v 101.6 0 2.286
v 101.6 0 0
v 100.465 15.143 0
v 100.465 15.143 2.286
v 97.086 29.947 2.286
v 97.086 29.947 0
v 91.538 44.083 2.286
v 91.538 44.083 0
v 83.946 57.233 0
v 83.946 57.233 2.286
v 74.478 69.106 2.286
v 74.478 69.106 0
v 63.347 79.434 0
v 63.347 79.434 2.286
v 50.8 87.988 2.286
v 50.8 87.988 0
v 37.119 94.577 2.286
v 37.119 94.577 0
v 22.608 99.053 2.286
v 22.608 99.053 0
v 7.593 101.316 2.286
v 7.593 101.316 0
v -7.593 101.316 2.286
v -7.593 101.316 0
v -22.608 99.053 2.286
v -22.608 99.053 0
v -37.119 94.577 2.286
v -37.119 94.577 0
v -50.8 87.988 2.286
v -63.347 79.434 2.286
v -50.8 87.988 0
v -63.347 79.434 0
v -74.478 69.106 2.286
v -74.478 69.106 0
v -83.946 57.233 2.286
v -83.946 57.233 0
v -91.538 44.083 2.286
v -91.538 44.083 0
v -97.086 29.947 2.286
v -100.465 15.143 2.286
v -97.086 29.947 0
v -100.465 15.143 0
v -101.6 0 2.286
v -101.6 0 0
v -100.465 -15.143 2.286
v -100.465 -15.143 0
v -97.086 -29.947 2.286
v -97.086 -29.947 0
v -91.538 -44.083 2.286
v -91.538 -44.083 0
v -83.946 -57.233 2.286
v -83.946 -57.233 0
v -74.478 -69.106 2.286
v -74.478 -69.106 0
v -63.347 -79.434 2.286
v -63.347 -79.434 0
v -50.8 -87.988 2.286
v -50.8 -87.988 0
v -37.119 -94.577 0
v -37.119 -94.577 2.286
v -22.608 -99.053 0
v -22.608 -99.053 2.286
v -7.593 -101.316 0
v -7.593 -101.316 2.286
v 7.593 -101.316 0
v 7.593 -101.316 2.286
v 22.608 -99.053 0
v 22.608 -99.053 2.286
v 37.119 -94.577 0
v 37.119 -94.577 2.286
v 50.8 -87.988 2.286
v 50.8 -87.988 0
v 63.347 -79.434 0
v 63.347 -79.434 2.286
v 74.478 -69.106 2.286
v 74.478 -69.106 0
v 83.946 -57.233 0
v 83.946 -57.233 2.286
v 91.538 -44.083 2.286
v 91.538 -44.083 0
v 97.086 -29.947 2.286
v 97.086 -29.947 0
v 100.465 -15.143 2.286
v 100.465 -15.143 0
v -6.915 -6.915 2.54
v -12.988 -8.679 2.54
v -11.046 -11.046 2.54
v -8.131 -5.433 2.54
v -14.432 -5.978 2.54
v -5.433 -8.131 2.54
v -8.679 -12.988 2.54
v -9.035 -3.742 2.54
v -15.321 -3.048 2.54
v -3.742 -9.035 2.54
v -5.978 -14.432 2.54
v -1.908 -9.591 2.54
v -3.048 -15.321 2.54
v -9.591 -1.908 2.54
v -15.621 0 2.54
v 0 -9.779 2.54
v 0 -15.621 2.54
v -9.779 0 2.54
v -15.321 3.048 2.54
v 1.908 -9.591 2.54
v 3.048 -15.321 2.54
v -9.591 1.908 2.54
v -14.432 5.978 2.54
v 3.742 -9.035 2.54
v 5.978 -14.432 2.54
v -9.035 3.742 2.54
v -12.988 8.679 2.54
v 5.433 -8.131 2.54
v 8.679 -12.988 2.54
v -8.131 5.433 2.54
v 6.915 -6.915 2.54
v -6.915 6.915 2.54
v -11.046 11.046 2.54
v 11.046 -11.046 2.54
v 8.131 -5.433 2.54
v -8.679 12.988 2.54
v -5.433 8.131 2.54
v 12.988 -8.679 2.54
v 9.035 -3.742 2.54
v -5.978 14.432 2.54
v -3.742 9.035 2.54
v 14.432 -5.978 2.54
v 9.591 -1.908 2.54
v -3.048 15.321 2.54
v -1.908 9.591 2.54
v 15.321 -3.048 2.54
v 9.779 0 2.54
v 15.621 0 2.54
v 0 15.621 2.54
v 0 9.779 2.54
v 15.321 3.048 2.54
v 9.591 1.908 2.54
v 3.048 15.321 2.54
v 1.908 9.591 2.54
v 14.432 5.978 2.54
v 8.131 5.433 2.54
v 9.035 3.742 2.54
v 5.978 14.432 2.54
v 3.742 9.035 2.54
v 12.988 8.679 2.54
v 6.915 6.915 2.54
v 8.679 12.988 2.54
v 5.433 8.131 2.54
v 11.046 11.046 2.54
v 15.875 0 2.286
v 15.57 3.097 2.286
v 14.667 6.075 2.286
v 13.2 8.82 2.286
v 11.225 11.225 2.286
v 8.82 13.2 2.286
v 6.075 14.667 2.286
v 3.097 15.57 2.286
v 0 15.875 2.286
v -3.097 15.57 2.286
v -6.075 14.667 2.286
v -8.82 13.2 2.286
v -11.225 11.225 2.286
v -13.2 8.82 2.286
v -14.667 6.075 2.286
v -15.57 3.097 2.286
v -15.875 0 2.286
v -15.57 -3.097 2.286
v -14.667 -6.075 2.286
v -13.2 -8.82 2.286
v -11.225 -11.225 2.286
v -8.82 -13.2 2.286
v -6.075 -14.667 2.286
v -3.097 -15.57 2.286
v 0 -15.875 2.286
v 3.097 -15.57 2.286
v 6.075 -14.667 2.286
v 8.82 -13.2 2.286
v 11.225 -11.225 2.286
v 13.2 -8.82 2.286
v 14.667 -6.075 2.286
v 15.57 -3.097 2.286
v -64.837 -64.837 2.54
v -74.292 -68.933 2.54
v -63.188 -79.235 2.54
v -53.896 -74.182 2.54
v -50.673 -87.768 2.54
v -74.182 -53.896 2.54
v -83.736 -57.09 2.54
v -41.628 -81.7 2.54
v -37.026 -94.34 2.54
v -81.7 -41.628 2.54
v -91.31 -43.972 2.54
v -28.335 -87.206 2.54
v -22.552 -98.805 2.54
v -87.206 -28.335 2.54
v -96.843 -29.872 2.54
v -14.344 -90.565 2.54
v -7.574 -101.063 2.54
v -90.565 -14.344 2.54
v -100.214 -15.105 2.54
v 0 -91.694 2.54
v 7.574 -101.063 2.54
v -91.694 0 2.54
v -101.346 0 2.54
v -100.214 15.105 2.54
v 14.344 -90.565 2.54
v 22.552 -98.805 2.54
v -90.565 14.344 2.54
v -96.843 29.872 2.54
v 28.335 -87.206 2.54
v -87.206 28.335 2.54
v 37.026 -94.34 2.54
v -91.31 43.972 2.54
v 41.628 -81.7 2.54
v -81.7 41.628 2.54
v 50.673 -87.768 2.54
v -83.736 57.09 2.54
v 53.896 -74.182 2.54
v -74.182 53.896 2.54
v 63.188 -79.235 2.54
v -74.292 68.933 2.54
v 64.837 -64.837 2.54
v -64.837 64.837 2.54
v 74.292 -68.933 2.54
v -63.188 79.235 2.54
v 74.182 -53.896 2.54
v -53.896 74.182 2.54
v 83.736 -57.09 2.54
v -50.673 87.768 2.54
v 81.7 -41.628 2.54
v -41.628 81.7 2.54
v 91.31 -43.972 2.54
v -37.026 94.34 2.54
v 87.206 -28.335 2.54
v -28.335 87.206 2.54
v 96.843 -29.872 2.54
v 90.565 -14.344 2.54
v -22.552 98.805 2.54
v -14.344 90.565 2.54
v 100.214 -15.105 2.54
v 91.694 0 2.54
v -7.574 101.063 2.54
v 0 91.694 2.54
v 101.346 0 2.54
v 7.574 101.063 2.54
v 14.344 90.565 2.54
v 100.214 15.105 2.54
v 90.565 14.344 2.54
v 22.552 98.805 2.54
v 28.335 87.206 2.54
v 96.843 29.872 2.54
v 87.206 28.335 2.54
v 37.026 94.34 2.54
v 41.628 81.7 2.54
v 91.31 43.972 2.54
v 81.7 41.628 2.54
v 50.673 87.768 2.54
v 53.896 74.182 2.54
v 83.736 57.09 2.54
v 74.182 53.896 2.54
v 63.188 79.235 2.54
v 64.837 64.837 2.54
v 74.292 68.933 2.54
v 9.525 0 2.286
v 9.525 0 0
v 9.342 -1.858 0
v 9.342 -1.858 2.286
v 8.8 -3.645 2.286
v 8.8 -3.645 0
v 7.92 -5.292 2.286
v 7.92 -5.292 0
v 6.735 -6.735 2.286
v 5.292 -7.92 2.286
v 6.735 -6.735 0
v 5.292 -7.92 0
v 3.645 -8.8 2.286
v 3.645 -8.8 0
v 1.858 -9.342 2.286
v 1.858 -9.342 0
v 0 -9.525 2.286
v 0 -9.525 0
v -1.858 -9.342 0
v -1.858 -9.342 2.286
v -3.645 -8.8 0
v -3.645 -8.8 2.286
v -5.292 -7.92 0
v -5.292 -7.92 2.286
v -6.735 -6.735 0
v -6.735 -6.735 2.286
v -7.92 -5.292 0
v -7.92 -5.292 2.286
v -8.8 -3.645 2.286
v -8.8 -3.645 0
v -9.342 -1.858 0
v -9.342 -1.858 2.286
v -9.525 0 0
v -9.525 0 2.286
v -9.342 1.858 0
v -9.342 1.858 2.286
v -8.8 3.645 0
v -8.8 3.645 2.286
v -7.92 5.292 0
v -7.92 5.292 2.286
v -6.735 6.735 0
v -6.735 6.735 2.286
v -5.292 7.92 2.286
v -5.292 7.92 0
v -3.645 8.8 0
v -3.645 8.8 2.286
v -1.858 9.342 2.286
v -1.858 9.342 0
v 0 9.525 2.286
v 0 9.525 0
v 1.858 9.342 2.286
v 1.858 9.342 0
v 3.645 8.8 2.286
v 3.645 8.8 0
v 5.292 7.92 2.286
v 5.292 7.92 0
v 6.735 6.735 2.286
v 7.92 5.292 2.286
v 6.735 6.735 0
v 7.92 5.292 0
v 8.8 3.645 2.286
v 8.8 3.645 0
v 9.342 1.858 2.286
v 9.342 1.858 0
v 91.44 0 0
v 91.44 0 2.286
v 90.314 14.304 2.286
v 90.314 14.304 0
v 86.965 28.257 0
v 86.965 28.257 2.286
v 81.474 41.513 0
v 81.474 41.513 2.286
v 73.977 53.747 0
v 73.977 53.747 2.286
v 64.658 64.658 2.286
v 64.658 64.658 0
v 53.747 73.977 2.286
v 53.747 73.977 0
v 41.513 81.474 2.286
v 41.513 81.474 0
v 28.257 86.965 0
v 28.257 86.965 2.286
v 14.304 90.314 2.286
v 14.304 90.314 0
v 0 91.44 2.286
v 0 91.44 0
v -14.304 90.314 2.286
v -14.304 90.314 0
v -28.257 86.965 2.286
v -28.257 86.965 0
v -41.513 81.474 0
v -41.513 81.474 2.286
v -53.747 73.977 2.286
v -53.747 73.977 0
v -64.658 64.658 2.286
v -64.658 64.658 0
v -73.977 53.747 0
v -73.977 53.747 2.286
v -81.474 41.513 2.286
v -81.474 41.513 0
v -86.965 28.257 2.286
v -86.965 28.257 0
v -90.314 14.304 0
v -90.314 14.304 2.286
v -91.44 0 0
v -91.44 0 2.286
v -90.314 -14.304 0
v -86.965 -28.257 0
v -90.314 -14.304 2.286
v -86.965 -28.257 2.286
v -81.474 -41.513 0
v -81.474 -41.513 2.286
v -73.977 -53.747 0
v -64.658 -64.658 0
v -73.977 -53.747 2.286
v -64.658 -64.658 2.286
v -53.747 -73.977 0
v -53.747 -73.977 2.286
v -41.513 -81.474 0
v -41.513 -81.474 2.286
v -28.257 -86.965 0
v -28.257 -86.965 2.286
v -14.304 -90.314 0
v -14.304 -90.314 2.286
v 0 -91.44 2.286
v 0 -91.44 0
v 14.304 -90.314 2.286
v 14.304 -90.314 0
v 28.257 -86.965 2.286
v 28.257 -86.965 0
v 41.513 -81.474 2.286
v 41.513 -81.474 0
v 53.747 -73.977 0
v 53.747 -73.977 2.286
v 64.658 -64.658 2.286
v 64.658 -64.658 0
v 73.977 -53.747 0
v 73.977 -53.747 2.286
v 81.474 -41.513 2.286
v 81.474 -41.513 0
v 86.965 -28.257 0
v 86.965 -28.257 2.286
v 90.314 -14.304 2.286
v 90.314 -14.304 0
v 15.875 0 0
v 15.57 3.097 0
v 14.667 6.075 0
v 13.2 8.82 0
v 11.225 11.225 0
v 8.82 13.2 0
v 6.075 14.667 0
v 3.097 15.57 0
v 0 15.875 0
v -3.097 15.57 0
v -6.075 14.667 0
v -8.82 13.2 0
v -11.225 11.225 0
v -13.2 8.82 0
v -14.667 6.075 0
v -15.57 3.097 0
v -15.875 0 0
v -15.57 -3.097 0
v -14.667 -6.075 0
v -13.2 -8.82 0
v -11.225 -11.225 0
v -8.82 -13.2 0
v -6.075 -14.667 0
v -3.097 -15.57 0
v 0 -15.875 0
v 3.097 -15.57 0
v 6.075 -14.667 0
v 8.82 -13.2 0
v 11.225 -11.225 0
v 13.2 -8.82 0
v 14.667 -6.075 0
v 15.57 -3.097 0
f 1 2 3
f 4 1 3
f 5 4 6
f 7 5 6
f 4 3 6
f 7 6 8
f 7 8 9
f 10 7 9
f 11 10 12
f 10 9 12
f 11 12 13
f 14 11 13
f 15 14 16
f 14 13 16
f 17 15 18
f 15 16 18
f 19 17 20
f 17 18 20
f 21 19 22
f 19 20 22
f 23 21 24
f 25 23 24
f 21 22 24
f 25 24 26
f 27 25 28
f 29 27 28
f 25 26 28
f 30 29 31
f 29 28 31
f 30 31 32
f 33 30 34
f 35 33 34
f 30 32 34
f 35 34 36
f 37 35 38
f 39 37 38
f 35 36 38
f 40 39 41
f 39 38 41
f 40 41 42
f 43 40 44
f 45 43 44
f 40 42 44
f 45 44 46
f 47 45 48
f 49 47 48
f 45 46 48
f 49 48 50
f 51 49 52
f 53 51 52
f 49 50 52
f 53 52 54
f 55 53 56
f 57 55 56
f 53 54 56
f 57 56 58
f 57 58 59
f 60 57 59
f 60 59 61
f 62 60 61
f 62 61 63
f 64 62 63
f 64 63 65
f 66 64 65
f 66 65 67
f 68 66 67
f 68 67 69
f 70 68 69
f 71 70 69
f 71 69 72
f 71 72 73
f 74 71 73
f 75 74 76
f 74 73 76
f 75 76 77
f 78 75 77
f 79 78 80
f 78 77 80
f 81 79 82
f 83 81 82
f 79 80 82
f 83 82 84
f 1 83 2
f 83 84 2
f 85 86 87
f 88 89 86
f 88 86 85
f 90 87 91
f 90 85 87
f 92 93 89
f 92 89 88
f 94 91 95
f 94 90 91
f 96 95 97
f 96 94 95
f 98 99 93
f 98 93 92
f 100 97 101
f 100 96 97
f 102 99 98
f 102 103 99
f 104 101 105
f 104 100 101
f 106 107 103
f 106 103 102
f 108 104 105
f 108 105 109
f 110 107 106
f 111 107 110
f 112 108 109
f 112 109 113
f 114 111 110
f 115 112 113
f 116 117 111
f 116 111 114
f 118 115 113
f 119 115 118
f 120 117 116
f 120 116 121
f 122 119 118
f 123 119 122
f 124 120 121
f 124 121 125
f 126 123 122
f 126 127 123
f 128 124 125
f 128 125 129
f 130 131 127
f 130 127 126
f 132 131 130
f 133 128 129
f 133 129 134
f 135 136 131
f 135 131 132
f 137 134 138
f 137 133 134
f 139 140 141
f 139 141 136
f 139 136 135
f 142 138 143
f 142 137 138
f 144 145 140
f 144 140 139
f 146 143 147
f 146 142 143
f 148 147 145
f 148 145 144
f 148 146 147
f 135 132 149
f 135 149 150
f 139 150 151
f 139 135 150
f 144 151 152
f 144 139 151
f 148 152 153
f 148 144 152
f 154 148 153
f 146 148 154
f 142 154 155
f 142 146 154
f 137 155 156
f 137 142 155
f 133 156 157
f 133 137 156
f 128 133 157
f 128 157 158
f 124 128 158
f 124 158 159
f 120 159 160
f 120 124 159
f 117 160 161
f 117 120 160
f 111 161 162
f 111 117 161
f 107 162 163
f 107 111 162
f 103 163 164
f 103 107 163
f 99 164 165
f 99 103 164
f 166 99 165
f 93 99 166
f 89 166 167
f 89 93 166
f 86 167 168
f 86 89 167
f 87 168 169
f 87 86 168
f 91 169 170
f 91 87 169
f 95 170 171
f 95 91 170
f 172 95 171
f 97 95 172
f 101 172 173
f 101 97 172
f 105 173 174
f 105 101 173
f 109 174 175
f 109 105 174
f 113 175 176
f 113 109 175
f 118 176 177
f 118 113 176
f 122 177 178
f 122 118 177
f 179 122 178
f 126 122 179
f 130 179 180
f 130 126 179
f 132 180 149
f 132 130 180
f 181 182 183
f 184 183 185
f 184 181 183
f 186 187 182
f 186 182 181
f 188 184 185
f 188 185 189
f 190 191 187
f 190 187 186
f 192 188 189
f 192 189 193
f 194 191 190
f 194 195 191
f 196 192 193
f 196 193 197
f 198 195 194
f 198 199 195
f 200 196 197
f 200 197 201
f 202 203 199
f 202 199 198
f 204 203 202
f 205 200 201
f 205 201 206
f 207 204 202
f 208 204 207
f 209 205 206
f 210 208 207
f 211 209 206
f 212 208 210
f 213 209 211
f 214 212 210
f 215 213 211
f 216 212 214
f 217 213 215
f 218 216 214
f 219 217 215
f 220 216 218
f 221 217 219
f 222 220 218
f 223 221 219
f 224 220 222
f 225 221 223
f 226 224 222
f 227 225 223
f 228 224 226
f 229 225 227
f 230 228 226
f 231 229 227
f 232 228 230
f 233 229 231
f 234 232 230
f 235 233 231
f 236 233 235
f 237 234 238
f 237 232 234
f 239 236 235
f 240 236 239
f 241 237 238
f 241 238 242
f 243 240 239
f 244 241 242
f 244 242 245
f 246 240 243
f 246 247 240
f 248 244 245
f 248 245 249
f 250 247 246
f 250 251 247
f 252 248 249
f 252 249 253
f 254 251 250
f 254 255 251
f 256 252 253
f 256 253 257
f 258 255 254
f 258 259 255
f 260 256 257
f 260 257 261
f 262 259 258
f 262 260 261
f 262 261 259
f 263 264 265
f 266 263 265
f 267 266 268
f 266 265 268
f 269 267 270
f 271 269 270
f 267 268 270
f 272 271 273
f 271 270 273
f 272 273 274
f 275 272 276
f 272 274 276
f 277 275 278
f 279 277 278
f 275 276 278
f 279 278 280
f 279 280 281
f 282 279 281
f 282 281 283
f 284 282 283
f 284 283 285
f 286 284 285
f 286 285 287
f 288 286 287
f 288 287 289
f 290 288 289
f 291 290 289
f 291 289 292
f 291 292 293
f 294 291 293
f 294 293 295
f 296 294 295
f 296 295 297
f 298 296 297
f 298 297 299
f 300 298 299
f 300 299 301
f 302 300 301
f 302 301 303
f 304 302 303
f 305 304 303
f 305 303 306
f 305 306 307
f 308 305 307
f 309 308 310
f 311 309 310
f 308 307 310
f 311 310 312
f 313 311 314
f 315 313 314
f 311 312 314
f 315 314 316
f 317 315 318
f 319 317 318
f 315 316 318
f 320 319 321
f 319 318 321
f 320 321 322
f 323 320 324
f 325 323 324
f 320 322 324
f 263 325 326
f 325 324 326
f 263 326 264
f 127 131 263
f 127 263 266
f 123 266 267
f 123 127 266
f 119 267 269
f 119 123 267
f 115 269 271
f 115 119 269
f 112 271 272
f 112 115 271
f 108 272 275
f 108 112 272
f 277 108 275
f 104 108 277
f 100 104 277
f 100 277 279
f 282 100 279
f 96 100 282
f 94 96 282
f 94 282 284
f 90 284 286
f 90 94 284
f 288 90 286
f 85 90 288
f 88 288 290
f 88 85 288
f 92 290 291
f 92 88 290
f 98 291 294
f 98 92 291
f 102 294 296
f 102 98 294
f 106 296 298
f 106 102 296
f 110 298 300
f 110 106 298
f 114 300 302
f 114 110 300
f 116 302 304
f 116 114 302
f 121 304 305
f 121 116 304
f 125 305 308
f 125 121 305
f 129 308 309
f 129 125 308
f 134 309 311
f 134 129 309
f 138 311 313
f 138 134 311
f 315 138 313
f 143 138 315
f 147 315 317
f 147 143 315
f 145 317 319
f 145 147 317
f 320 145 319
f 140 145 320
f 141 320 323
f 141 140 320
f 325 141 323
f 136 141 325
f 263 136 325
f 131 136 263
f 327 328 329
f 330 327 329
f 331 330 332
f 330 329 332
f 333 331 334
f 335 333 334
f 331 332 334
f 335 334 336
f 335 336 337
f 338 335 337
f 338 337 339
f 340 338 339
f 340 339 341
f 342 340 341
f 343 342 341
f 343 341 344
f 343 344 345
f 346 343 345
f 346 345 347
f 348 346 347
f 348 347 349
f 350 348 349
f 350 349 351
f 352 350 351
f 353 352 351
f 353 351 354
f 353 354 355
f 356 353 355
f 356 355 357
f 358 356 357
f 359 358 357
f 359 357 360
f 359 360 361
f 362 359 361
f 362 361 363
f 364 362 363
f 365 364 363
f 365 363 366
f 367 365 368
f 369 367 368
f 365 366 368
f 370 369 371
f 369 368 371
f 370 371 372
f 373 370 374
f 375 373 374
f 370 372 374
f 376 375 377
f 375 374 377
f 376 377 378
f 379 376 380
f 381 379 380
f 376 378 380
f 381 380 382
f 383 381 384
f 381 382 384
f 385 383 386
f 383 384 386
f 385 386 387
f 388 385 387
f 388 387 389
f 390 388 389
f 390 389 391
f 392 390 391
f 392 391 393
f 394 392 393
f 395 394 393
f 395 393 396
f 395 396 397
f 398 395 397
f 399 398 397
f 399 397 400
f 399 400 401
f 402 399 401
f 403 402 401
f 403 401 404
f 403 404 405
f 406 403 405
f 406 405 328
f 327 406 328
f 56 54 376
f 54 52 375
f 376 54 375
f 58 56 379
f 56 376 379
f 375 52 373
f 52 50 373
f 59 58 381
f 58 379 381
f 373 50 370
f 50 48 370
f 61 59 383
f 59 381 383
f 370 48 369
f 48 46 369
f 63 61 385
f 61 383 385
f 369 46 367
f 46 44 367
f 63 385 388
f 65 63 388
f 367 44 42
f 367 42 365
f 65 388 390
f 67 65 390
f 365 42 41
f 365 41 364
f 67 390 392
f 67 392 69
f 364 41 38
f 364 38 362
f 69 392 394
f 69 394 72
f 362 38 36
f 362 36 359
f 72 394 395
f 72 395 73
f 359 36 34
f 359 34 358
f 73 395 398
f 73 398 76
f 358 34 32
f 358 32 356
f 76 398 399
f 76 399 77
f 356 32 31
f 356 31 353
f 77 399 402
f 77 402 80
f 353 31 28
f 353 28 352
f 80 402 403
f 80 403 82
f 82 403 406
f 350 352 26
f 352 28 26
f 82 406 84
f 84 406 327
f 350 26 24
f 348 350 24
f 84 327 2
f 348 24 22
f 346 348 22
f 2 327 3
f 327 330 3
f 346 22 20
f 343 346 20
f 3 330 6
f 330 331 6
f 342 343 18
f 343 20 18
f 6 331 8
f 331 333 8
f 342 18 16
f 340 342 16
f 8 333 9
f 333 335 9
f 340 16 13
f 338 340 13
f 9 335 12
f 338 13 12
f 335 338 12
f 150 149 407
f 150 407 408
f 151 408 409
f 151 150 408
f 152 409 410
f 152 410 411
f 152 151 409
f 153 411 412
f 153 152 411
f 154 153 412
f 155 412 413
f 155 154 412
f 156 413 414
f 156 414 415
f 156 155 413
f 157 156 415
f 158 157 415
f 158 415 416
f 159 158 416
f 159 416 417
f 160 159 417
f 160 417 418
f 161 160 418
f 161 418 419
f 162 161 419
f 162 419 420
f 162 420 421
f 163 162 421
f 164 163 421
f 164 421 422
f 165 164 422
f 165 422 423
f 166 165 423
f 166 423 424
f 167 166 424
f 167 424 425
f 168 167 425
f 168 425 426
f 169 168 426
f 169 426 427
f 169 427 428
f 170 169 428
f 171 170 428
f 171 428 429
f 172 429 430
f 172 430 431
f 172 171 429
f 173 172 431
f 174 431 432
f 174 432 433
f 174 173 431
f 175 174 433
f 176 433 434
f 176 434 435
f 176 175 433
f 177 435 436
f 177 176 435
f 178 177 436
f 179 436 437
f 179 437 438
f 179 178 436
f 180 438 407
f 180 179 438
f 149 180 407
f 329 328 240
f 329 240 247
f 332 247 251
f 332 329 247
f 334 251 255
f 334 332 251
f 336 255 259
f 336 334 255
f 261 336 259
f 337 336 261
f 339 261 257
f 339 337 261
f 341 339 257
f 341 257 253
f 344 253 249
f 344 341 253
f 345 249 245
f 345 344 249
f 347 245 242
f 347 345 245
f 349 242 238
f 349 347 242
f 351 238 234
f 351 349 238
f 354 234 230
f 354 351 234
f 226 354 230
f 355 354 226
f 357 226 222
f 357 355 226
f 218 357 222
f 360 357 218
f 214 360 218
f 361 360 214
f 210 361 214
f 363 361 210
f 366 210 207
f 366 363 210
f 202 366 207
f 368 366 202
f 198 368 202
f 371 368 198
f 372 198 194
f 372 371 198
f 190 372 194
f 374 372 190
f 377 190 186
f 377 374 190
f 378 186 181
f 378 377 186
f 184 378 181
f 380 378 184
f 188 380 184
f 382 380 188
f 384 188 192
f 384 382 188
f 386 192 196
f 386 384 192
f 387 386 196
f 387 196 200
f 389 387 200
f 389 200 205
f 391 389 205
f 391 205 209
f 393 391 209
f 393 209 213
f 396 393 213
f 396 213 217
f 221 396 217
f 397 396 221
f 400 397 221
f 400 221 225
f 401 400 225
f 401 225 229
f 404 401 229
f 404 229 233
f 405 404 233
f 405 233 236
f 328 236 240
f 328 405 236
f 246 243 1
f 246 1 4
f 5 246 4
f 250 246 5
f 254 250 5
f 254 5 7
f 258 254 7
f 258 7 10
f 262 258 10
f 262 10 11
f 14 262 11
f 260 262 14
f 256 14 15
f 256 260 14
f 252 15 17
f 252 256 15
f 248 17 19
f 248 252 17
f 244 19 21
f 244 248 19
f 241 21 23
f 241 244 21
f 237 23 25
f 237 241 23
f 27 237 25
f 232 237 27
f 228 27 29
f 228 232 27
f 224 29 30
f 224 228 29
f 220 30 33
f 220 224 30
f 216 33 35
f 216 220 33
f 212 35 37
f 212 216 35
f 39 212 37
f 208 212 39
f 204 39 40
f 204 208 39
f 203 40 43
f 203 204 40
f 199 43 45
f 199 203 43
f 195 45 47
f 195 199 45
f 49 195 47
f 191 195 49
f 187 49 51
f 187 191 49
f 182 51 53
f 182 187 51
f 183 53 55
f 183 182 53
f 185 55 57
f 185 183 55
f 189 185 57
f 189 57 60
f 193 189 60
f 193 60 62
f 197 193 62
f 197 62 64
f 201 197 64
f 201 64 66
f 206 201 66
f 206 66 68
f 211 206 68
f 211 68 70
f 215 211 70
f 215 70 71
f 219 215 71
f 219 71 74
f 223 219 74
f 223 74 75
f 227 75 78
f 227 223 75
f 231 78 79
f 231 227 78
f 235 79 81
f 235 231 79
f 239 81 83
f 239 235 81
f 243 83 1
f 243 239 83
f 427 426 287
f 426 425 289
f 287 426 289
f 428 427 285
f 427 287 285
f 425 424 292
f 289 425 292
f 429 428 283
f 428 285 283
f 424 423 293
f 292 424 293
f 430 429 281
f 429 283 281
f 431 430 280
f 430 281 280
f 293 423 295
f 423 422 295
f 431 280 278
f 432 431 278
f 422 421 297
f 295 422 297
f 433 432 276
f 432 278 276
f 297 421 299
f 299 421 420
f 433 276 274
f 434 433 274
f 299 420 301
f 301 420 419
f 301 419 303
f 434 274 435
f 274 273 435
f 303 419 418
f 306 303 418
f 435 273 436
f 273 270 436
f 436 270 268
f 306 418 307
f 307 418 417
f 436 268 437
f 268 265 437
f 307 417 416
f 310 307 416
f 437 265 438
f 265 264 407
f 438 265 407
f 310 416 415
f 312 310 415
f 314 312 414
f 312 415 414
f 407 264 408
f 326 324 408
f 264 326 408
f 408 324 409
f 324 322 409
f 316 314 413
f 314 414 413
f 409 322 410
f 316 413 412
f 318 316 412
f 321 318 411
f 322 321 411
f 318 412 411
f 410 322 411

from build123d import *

# Parameters (mm, degrees)
F0_R     = 101.6
F1_DEPTH = 2.54
F2_R     = 9.525
F3_DEPTH = 25.4
F4_R     = 91.44
F4_R_2   = 15.875
F5_DEPTH = 2.541
F6_SIZE  = 0.254


with BuildPart() as f1:
    # F0 (on Top) → F1 (new body)
    with BuildSketch(Plane.XY):
        Circle(F0_R)
    extrude(amount=F1_DEPTH)

    # F2 (on face) → F3 (cut)
    with BuildSketch(Plane(origin=(0, 0, 0), x_dir=(1, 0, 0), z_dir=(0, 0, -1))):
        Circle(F2_R)
    extrude(amount=-F3_DEPTH, mode=Mode.SUBTRACT)

    # F4 (on face) → F5 (cut, through all)
    with BuildSketch(Plane.XY.offset(2.54)):
        Circle(F4_R)
        Circle(F4_R_2, mode=Mode.SUBTRACT)
    extrude(amount=-F5_DEPTH, mode=Mode.SUBTRACT)

    # F6
    f6_edges = [f1.edges().sort_by_distance(p)[0] for p in [
        (-101.6, 0, 2.54),
        (-91.44, 0, 2.54),
        (-15.875, 0, 2.54),
        (-9.525, 0, 2.54),
    ]]
    chamfer(f6_edges, length=F6_SIZE)


solid = f1.part
